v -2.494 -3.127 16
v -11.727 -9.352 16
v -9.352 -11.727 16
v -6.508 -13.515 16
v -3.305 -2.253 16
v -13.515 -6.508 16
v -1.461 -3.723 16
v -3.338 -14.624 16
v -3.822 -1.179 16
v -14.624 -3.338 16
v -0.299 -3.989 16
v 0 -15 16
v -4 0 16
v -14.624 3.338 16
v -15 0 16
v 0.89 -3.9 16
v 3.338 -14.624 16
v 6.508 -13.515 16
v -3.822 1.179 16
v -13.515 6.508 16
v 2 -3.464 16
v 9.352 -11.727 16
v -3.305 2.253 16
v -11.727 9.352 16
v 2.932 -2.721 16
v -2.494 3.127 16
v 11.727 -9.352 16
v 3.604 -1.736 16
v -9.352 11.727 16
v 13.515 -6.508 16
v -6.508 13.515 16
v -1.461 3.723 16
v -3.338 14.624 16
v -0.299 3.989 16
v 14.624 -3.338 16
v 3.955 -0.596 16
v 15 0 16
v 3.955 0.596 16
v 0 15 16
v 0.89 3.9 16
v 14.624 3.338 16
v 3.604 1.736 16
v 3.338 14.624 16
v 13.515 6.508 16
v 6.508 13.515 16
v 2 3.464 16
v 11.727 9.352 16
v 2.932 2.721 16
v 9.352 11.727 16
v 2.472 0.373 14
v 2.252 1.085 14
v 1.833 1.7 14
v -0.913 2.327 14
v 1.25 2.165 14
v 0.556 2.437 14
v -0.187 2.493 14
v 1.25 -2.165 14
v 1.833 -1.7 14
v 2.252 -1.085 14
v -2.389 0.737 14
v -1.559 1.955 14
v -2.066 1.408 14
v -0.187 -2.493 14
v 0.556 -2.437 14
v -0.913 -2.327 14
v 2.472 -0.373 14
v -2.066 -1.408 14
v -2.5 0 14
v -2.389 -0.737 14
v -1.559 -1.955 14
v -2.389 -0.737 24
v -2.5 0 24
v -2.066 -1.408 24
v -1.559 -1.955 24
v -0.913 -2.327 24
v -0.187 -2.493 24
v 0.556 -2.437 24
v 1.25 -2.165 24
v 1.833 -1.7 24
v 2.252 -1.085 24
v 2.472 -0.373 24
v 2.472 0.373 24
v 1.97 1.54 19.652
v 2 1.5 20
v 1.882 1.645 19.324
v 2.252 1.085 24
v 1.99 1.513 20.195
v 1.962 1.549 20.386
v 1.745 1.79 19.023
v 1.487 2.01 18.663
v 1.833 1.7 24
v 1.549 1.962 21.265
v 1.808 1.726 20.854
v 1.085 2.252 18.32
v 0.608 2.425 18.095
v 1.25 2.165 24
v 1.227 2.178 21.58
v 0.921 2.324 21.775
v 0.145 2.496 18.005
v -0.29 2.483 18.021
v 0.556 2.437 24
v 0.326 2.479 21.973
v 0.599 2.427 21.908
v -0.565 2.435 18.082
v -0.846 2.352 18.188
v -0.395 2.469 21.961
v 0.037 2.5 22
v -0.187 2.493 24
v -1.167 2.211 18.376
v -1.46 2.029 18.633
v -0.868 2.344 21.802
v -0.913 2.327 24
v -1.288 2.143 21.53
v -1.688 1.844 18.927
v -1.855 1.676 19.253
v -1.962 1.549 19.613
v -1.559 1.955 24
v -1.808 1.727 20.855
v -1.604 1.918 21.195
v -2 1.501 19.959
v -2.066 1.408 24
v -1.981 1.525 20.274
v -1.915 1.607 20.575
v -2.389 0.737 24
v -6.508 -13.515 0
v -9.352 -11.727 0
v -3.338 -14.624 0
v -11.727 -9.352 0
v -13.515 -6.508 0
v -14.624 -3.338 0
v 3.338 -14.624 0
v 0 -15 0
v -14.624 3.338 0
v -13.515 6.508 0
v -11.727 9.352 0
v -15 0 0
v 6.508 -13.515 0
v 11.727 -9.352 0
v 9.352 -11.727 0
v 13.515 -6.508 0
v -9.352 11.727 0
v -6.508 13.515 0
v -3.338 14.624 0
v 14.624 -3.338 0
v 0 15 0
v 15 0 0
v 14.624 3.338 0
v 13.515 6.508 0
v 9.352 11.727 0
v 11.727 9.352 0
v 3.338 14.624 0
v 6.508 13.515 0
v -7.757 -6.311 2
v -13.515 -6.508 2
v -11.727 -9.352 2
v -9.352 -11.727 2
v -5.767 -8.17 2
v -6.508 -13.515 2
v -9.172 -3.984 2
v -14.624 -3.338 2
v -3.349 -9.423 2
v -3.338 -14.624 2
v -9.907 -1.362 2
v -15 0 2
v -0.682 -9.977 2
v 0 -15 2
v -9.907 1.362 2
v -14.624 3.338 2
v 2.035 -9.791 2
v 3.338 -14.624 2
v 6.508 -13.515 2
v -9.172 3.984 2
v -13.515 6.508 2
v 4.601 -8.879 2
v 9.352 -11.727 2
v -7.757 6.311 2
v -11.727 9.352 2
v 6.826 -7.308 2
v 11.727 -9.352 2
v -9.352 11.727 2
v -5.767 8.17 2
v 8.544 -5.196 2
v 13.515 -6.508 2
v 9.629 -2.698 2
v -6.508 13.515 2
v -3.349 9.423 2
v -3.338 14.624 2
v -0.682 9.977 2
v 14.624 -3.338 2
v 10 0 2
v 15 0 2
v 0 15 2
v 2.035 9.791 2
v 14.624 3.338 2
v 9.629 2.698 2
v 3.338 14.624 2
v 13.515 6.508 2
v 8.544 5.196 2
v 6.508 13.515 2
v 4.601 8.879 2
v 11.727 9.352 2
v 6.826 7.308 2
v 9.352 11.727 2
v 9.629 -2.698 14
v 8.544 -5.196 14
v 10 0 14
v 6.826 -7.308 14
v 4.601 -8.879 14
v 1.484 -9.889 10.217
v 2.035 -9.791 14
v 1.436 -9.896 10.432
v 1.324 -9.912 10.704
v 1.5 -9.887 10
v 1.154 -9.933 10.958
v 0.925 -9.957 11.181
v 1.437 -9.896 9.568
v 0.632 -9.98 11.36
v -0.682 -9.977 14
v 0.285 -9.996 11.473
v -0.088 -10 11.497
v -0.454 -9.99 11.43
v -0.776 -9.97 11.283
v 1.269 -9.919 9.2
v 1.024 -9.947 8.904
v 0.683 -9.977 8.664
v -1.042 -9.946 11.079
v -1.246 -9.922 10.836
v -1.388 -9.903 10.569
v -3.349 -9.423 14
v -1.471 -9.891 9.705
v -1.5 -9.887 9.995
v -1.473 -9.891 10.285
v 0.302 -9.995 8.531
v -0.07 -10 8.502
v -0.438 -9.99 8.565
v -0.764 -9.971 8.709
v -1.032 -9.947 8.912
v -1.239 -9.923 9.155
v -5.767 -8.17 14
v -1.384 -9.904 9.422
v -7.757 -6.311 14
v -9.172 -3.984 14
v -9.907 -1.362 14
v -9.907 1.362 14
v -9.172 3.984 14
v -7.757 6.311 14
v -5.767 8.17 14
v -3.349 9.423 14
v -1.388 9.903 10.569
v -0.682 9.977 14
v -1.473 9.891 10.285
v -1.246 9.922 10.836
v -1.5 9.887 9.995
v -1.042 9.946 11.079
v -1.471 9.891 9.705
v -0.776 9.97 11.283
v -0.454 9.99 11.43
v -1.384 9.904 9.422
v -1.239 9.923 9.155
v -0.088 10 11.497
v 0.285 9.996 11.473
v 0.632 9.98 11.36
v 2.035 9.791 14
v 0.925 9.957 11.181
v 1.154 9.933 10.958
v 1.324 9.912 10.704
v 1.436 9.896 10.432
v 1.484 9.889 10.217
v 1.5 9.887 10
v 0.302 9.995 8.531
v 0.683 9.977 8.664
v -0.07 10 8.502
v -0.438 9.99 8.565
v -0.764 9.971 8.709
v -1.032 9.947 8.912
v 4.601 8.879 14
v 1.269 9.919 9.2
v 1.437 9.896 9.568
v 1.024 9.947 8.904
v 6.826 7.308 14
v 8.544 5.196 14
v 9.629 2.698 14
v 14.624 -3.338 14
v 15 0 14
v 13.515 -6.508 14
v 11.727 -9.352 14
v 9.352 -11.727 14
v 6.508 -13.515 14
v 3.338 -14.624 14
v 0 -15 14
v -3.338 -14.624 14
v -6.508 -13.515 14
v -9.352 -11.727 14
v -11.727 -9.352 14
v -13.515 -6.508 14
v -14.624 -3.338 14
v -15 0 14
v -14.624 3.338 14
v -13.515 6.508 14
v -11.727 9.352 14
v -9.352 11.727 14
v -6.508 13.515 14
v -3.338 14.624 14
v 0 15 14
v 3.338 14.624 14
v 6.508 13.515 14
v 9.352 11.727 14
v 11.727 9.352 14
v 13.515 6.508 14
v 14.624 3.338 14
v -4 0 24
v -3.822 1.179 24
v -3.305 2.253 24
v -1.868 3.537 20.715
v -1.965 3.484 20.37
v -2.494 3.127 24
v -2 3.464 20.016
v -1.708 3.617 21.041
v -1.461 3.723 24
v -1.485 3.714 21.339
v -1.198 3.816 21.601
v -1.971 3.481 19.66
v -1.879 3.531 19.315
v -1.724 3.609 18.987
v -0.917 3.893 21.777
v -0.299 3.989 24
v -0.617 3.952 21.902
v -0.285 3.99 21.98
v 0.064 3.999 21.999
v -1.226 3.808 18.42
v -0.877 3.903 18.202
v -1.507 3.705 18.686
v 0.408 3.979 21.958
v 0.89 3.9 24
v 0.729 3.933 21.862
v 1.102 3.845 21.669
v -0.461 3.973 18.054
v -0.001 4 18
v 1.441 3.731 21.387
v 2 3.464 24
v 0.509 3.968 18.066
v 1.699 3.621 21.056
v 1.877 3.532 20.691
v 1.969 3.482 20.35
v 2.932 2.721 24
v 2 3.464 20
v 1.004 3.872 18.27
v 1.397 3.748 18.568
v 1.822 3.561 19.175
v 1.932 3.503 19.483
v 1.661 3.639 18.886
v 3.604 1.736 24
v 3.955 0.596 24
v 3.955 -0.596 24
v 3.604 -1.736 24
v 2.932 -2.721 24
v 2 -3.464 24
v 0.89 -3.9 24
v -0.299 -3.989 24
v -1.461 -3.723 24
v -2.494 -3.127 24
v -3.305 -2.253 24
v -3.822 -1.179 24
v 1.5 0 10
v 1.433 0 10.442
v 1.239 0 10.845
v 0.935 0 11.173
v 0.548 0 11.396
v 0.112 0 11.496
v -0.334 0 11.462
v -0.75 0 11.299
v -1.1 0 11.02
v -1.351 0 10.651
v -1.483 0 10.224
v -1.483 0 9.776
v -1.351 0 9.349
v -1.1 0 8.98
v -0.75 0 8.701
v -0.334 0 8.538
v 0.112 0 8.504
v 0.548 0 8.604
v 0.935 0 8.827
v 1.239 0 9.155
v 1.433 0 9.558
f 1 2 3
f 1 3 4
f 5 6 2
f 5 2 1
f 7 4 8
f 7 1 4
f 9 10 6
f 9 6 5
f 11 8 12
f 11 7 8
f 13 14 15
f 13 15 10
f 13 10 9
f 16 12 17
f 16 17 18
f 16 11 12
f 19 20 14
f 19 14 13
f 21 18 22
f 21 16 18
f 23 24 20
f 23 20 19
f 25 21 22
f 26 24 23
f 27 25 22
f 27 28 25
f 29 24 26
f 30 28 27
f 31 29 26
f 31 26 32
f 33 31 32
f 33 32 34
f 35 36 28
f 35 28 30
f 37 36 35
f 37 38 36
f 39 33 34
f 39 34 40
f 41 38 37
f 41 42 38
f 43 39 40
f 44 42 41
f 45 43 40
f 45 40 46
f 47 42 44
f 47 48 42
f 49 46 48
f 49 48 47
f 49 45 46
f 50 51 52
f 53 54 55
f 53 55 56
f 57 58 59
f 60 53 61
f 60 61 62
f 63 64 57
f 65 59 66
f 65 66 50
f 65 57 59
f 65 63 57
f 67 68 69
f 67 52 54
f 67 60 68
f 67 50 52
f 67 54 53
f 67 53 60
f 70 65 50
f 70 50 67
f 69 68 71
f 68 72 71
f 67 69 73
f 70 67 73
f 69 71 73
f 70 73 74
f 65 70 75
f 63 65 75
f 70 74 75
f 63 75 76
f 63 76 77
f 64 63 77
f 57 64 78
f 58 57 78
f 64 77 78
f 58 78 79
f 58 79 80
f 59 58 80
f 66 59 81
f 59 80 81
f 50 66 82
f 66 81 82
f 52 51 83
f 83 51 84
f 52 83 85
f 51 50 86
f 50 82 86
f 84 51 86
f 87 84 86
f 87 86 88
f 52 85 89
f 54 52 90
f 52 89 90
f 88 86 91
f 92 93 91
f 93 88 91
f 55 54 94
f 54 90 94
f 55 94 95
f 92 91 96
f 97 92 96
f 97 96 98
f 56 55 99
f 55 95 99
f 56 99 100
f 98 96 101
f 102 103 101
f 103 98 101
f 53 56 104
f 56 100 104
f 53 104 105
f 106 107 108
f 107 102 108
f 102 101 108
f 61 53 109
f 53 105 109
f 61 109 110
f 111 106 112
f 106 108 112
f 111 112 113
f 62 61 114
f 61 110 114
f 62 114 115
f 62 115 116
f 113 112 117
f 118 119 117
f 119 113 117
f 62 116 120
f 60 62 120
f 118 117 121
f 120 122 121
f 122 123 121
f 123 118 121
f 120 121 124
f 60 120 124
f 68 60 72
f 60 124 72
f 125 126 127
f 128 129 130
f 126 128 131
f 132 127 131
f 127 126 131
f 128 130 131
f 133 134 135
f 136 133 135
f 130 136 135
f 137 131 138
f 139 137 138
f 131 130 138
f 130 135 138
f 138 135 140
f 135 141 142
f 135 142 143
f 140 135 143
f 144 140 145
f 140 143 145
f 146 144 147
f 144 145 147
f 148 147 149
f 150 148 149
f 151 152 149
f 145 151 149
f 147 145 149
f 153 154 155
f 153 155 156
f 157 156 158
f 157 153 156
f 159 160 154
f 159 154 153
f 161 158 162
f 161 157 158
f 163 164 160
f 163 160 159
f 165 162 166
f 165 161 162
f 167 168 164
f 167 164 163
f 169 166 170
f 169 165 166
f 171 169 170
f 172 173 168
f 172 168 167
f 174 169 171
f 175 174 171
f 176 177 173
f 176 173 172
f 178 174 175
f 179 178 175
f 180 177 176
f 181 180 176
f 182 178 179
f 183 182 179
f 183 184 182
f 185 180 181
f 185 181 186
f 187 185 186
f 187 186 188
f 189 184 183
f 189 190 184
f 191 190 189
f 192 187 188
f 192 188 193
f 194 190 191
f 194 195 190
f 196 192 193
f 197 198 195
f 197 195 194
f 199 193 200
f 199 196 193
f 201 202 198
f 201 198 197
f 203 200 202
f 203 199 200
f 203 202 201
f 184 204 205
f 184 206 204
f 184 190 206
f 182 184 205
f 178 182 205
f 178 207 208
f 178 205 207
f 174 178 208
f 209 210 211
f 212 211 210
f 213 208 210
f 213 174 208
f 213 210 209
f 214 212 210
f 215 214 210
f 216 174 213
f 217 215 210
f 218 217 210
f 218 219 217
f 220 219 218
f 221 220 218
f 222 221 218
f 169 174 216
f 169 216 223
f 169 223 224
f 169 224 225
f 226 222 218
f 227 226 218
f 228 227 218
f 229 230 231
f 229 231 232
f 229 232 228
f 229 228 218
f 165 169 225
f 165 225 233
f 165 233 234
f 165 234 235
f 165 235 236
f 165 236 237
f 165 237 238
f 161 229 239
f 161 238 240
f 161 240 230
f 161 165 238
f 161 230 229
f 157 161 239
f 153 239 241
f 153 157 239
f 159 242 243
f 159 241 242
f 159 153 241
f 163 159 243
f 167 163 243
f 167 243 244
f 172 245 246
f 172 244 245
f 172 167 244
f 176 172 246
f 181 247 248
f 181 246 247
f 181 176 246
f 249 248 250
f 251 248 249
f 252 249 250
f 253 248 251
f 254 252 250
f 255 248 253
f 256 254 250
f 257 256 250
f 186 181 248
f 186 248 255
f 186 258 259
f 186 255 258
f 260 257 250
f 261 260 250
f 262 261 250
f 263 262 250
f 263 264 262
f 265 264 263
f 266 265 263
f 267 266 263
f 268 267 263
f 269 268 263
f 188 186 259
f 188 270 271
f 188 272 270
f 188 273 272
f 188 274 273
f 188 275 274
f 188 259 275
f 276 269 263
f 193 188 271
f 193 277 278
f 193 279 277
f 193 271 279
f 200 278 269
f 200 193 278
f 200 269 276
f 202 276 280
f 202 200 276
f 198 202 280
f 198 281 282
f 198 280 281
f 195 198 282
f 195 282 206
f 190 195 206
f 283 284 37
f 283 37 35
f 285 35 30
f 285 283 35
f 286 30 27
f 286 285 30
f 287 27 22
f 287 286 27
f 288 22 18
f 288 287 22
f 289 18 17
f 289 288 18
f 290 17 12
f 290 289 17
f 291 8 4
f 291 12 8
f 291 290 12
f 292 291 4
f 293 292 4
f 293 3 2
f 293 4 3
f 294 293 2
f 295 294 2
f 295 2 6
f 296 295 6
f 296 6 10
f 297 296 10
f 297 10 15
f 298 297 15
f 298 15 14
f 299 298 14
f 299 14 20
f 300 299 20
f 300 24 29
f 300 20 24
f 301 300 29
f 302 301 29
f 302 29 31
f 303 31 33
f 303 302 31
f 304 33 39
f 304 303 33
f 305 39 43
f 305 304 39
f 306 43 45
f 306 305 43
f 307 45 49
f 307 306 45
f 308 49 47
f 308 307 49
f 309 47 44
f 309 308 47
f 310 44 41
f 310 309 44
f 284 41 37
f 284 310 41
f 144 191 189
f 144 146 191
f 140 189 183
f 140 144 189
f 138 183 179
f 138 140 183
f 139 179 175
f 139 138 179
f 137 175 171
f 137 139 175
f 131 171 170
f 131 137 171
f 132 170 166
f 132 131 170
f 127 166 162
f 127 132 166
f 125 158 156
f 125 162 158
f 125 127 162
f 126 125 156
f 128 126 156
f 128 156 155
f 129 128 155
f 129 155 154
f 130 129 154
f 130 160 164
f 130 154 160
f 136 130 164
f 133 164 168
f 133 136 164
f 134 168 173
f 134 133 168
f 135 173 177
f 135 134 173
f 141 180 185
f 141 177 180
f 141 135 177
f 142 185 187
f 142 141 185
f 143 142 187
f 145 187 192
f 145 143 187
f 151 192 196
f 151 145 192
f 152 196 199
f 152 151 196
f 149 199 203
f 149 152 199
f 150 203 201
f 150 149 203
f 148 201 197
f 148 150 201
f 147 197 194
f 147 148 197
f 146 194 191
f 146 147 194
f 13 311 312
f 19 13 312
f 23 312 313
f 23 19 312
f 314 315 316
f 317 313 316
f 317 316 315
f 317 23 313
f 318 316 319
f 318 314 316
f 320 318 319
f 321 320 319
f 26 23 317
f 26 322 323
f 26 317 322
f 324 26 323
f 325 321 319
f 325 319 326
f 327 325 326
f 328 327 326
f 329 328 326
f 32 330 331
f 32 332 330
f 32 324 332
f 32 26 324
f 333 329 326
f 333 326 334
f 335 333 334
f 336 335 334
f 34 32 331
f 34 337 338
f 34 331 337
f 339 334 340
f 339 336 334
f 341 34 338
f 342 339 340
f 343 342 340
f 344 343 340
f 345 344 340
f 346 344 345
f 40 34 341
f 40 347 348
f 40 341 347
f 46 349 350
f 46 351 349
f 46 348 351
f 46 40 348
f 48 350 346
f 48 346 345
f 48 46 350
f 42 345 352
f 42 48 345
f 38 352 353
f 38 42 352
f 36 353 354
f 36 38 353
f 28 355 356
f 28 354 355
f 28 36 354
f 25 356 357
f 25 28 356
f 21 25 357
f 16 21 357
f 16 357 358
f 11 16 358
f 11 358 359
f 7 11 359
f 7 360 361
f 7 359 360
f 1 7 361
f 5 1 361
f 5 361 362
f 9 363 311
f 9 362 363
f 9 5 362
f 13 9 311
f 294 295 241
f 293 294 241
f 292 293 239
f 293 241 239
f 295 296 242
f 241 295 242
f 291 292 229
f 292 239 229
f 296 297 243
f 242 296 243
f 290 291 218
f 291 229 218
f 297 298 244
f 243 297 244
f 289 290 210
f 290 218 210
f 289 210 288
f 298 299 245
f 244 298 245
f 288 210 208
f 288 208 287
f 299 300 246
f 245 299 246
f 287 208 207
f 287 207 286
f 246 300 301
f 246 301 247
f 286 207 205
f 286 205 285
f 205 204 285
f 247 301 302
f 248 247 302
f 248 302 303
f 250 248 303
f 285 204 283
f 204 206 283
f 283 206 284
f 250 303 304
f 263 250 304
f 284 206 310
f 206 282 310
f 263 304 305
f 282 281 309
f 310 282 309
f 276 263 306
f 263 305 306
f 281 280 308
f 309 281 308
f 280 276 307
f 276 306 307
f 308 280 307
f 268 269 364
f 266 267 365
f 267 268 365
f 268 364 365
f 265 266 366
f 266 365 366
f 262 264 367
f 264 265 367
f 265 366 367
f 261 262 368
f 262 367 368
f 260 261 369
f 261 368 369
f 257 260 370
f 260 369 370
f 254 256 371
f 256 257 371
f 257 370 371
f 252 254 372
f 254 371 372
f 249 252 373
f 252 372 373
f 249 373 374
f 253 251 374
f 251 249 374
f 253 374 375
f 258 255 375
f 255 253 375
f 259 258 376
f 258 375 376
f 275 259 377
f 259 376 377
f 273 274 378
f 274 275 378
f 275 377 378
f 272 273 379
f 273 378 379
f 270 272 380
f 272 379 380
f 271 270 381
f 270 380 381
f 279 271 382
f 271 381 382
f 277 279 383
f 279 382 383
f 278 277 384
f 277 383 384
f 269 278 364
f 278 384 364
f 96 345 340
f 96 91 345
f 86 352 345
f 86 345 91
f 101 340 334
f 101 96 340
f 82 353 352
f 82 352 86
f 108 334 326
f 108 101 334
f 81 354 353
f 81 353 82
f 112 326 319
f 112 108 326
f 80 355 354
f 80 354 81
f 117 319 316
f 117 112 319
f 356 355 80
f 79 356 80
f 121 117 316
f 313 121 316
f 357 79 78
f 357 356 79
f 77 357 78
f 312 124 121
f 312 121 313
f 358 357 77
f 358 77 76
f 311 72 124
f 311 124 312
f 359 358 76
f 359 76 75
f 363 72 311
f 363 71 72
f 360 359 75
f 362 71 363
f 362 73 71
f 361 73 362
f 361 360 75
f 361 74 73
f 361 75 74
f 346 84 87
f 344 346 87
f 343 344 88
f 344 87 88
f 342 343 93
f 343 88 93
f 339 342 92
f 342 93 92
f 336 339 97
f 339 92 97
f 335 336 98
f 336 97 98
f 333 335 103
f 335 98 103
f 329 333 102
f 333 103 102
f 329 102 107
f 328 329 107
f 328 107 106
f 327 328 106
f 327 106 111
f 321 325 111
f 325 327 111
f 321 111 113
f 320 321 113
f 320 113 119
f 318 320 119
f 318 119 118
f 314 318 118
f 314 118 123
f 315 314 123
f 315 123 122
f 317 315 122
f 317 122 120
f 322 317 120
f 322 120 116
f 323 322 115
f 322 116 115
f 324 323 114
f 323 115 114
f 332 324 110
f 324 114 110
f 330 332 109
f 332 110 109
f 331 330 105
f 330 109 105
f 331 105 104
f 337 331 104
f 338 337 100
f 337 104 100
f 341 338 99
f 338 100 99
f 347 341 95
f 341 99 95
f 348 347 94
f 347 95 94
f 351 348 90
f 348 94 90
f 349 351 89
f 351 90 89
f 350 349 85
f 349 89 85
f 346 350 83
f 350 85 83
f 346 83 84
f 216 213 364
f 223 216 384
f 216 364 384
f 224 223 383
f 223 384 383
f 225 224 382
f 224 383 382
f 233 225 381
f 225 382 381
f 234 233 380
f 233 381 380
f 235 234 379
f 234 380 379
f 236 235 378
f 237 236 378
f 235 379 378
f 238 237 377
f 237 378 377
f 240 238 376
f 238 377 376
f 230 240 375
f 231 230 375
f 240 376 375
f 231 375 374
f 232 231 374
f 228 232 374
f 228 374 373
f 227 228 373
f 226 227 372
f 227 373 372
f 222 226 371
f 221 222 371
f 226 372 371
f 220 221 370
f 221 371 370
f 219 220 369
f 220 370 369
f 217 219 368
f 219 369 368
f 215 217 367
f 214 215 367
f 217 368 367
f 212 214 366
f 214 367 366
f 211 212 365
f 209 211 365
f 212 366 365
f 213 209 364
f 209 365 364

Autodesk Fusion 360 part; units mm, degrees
sketch "Sketch1" plane through (0, 0, 0) normal (0, 0, 1) x (1, 0, 0)
  circle A0 centre (0, 0) radius 15
  dimension "d1" = 30
extrude "Extrude1" add sketch "Sketch1" along normal blind 16
ref_plane "WorkPlane2" through (0, 0, 2) normal (0, 0, 1) x (1, 0, 0)
sketch "Sketch2" plane through (0, 0, 2) normal (0, 0, 1) x (1, 0, 0)
  circle A0 centre (0, 0) radius 10
  circle A1 centre (0, 0) radius 15
  dimension "d6" = 20
extrude "Extrude2" cut sketch "Sketch2" along normal blind 12
sketch "Sketch3" plane through (0, 0, 16) normal (0, 0, 1) x (-1, 0, 0)
  circle A0 centre (0, 0) radius 15
  circle A1 centre (0, 0) radius 4
  dimension "d9" = 8
extrude "Extrude3" add sketch "Sketch3" along normal blind 8 contours A1
sketch "Sketch4" plane through (0, 0, 0) normal (0, 1, 0) x (1, 0, 0)
  circle A0 centre (0, -20) radius 2
  circle A1 centre (0, -10) radius 1.5
  dimension "d12" = 4
  dimension "d13" = 3
extrude "Extrude4" cut sketch "Sketch4" along normal blind 5 contours A0
extrude "Extrude5" cut sketch "Sketch4" along normal mid plane 40 contours A1
sketch "Sketch5" plane through (0, 0, 24) normal (0, 0, 1) x (-1, 0, 0)
  circle A0 centre (0, 0) radius 4
  circle A1 centre (0, 0) radius 2.5
  dimension "d18" = 5
extrude "Extrude6" cut sketch "Sketch5" against normal blind 10 contours A1
